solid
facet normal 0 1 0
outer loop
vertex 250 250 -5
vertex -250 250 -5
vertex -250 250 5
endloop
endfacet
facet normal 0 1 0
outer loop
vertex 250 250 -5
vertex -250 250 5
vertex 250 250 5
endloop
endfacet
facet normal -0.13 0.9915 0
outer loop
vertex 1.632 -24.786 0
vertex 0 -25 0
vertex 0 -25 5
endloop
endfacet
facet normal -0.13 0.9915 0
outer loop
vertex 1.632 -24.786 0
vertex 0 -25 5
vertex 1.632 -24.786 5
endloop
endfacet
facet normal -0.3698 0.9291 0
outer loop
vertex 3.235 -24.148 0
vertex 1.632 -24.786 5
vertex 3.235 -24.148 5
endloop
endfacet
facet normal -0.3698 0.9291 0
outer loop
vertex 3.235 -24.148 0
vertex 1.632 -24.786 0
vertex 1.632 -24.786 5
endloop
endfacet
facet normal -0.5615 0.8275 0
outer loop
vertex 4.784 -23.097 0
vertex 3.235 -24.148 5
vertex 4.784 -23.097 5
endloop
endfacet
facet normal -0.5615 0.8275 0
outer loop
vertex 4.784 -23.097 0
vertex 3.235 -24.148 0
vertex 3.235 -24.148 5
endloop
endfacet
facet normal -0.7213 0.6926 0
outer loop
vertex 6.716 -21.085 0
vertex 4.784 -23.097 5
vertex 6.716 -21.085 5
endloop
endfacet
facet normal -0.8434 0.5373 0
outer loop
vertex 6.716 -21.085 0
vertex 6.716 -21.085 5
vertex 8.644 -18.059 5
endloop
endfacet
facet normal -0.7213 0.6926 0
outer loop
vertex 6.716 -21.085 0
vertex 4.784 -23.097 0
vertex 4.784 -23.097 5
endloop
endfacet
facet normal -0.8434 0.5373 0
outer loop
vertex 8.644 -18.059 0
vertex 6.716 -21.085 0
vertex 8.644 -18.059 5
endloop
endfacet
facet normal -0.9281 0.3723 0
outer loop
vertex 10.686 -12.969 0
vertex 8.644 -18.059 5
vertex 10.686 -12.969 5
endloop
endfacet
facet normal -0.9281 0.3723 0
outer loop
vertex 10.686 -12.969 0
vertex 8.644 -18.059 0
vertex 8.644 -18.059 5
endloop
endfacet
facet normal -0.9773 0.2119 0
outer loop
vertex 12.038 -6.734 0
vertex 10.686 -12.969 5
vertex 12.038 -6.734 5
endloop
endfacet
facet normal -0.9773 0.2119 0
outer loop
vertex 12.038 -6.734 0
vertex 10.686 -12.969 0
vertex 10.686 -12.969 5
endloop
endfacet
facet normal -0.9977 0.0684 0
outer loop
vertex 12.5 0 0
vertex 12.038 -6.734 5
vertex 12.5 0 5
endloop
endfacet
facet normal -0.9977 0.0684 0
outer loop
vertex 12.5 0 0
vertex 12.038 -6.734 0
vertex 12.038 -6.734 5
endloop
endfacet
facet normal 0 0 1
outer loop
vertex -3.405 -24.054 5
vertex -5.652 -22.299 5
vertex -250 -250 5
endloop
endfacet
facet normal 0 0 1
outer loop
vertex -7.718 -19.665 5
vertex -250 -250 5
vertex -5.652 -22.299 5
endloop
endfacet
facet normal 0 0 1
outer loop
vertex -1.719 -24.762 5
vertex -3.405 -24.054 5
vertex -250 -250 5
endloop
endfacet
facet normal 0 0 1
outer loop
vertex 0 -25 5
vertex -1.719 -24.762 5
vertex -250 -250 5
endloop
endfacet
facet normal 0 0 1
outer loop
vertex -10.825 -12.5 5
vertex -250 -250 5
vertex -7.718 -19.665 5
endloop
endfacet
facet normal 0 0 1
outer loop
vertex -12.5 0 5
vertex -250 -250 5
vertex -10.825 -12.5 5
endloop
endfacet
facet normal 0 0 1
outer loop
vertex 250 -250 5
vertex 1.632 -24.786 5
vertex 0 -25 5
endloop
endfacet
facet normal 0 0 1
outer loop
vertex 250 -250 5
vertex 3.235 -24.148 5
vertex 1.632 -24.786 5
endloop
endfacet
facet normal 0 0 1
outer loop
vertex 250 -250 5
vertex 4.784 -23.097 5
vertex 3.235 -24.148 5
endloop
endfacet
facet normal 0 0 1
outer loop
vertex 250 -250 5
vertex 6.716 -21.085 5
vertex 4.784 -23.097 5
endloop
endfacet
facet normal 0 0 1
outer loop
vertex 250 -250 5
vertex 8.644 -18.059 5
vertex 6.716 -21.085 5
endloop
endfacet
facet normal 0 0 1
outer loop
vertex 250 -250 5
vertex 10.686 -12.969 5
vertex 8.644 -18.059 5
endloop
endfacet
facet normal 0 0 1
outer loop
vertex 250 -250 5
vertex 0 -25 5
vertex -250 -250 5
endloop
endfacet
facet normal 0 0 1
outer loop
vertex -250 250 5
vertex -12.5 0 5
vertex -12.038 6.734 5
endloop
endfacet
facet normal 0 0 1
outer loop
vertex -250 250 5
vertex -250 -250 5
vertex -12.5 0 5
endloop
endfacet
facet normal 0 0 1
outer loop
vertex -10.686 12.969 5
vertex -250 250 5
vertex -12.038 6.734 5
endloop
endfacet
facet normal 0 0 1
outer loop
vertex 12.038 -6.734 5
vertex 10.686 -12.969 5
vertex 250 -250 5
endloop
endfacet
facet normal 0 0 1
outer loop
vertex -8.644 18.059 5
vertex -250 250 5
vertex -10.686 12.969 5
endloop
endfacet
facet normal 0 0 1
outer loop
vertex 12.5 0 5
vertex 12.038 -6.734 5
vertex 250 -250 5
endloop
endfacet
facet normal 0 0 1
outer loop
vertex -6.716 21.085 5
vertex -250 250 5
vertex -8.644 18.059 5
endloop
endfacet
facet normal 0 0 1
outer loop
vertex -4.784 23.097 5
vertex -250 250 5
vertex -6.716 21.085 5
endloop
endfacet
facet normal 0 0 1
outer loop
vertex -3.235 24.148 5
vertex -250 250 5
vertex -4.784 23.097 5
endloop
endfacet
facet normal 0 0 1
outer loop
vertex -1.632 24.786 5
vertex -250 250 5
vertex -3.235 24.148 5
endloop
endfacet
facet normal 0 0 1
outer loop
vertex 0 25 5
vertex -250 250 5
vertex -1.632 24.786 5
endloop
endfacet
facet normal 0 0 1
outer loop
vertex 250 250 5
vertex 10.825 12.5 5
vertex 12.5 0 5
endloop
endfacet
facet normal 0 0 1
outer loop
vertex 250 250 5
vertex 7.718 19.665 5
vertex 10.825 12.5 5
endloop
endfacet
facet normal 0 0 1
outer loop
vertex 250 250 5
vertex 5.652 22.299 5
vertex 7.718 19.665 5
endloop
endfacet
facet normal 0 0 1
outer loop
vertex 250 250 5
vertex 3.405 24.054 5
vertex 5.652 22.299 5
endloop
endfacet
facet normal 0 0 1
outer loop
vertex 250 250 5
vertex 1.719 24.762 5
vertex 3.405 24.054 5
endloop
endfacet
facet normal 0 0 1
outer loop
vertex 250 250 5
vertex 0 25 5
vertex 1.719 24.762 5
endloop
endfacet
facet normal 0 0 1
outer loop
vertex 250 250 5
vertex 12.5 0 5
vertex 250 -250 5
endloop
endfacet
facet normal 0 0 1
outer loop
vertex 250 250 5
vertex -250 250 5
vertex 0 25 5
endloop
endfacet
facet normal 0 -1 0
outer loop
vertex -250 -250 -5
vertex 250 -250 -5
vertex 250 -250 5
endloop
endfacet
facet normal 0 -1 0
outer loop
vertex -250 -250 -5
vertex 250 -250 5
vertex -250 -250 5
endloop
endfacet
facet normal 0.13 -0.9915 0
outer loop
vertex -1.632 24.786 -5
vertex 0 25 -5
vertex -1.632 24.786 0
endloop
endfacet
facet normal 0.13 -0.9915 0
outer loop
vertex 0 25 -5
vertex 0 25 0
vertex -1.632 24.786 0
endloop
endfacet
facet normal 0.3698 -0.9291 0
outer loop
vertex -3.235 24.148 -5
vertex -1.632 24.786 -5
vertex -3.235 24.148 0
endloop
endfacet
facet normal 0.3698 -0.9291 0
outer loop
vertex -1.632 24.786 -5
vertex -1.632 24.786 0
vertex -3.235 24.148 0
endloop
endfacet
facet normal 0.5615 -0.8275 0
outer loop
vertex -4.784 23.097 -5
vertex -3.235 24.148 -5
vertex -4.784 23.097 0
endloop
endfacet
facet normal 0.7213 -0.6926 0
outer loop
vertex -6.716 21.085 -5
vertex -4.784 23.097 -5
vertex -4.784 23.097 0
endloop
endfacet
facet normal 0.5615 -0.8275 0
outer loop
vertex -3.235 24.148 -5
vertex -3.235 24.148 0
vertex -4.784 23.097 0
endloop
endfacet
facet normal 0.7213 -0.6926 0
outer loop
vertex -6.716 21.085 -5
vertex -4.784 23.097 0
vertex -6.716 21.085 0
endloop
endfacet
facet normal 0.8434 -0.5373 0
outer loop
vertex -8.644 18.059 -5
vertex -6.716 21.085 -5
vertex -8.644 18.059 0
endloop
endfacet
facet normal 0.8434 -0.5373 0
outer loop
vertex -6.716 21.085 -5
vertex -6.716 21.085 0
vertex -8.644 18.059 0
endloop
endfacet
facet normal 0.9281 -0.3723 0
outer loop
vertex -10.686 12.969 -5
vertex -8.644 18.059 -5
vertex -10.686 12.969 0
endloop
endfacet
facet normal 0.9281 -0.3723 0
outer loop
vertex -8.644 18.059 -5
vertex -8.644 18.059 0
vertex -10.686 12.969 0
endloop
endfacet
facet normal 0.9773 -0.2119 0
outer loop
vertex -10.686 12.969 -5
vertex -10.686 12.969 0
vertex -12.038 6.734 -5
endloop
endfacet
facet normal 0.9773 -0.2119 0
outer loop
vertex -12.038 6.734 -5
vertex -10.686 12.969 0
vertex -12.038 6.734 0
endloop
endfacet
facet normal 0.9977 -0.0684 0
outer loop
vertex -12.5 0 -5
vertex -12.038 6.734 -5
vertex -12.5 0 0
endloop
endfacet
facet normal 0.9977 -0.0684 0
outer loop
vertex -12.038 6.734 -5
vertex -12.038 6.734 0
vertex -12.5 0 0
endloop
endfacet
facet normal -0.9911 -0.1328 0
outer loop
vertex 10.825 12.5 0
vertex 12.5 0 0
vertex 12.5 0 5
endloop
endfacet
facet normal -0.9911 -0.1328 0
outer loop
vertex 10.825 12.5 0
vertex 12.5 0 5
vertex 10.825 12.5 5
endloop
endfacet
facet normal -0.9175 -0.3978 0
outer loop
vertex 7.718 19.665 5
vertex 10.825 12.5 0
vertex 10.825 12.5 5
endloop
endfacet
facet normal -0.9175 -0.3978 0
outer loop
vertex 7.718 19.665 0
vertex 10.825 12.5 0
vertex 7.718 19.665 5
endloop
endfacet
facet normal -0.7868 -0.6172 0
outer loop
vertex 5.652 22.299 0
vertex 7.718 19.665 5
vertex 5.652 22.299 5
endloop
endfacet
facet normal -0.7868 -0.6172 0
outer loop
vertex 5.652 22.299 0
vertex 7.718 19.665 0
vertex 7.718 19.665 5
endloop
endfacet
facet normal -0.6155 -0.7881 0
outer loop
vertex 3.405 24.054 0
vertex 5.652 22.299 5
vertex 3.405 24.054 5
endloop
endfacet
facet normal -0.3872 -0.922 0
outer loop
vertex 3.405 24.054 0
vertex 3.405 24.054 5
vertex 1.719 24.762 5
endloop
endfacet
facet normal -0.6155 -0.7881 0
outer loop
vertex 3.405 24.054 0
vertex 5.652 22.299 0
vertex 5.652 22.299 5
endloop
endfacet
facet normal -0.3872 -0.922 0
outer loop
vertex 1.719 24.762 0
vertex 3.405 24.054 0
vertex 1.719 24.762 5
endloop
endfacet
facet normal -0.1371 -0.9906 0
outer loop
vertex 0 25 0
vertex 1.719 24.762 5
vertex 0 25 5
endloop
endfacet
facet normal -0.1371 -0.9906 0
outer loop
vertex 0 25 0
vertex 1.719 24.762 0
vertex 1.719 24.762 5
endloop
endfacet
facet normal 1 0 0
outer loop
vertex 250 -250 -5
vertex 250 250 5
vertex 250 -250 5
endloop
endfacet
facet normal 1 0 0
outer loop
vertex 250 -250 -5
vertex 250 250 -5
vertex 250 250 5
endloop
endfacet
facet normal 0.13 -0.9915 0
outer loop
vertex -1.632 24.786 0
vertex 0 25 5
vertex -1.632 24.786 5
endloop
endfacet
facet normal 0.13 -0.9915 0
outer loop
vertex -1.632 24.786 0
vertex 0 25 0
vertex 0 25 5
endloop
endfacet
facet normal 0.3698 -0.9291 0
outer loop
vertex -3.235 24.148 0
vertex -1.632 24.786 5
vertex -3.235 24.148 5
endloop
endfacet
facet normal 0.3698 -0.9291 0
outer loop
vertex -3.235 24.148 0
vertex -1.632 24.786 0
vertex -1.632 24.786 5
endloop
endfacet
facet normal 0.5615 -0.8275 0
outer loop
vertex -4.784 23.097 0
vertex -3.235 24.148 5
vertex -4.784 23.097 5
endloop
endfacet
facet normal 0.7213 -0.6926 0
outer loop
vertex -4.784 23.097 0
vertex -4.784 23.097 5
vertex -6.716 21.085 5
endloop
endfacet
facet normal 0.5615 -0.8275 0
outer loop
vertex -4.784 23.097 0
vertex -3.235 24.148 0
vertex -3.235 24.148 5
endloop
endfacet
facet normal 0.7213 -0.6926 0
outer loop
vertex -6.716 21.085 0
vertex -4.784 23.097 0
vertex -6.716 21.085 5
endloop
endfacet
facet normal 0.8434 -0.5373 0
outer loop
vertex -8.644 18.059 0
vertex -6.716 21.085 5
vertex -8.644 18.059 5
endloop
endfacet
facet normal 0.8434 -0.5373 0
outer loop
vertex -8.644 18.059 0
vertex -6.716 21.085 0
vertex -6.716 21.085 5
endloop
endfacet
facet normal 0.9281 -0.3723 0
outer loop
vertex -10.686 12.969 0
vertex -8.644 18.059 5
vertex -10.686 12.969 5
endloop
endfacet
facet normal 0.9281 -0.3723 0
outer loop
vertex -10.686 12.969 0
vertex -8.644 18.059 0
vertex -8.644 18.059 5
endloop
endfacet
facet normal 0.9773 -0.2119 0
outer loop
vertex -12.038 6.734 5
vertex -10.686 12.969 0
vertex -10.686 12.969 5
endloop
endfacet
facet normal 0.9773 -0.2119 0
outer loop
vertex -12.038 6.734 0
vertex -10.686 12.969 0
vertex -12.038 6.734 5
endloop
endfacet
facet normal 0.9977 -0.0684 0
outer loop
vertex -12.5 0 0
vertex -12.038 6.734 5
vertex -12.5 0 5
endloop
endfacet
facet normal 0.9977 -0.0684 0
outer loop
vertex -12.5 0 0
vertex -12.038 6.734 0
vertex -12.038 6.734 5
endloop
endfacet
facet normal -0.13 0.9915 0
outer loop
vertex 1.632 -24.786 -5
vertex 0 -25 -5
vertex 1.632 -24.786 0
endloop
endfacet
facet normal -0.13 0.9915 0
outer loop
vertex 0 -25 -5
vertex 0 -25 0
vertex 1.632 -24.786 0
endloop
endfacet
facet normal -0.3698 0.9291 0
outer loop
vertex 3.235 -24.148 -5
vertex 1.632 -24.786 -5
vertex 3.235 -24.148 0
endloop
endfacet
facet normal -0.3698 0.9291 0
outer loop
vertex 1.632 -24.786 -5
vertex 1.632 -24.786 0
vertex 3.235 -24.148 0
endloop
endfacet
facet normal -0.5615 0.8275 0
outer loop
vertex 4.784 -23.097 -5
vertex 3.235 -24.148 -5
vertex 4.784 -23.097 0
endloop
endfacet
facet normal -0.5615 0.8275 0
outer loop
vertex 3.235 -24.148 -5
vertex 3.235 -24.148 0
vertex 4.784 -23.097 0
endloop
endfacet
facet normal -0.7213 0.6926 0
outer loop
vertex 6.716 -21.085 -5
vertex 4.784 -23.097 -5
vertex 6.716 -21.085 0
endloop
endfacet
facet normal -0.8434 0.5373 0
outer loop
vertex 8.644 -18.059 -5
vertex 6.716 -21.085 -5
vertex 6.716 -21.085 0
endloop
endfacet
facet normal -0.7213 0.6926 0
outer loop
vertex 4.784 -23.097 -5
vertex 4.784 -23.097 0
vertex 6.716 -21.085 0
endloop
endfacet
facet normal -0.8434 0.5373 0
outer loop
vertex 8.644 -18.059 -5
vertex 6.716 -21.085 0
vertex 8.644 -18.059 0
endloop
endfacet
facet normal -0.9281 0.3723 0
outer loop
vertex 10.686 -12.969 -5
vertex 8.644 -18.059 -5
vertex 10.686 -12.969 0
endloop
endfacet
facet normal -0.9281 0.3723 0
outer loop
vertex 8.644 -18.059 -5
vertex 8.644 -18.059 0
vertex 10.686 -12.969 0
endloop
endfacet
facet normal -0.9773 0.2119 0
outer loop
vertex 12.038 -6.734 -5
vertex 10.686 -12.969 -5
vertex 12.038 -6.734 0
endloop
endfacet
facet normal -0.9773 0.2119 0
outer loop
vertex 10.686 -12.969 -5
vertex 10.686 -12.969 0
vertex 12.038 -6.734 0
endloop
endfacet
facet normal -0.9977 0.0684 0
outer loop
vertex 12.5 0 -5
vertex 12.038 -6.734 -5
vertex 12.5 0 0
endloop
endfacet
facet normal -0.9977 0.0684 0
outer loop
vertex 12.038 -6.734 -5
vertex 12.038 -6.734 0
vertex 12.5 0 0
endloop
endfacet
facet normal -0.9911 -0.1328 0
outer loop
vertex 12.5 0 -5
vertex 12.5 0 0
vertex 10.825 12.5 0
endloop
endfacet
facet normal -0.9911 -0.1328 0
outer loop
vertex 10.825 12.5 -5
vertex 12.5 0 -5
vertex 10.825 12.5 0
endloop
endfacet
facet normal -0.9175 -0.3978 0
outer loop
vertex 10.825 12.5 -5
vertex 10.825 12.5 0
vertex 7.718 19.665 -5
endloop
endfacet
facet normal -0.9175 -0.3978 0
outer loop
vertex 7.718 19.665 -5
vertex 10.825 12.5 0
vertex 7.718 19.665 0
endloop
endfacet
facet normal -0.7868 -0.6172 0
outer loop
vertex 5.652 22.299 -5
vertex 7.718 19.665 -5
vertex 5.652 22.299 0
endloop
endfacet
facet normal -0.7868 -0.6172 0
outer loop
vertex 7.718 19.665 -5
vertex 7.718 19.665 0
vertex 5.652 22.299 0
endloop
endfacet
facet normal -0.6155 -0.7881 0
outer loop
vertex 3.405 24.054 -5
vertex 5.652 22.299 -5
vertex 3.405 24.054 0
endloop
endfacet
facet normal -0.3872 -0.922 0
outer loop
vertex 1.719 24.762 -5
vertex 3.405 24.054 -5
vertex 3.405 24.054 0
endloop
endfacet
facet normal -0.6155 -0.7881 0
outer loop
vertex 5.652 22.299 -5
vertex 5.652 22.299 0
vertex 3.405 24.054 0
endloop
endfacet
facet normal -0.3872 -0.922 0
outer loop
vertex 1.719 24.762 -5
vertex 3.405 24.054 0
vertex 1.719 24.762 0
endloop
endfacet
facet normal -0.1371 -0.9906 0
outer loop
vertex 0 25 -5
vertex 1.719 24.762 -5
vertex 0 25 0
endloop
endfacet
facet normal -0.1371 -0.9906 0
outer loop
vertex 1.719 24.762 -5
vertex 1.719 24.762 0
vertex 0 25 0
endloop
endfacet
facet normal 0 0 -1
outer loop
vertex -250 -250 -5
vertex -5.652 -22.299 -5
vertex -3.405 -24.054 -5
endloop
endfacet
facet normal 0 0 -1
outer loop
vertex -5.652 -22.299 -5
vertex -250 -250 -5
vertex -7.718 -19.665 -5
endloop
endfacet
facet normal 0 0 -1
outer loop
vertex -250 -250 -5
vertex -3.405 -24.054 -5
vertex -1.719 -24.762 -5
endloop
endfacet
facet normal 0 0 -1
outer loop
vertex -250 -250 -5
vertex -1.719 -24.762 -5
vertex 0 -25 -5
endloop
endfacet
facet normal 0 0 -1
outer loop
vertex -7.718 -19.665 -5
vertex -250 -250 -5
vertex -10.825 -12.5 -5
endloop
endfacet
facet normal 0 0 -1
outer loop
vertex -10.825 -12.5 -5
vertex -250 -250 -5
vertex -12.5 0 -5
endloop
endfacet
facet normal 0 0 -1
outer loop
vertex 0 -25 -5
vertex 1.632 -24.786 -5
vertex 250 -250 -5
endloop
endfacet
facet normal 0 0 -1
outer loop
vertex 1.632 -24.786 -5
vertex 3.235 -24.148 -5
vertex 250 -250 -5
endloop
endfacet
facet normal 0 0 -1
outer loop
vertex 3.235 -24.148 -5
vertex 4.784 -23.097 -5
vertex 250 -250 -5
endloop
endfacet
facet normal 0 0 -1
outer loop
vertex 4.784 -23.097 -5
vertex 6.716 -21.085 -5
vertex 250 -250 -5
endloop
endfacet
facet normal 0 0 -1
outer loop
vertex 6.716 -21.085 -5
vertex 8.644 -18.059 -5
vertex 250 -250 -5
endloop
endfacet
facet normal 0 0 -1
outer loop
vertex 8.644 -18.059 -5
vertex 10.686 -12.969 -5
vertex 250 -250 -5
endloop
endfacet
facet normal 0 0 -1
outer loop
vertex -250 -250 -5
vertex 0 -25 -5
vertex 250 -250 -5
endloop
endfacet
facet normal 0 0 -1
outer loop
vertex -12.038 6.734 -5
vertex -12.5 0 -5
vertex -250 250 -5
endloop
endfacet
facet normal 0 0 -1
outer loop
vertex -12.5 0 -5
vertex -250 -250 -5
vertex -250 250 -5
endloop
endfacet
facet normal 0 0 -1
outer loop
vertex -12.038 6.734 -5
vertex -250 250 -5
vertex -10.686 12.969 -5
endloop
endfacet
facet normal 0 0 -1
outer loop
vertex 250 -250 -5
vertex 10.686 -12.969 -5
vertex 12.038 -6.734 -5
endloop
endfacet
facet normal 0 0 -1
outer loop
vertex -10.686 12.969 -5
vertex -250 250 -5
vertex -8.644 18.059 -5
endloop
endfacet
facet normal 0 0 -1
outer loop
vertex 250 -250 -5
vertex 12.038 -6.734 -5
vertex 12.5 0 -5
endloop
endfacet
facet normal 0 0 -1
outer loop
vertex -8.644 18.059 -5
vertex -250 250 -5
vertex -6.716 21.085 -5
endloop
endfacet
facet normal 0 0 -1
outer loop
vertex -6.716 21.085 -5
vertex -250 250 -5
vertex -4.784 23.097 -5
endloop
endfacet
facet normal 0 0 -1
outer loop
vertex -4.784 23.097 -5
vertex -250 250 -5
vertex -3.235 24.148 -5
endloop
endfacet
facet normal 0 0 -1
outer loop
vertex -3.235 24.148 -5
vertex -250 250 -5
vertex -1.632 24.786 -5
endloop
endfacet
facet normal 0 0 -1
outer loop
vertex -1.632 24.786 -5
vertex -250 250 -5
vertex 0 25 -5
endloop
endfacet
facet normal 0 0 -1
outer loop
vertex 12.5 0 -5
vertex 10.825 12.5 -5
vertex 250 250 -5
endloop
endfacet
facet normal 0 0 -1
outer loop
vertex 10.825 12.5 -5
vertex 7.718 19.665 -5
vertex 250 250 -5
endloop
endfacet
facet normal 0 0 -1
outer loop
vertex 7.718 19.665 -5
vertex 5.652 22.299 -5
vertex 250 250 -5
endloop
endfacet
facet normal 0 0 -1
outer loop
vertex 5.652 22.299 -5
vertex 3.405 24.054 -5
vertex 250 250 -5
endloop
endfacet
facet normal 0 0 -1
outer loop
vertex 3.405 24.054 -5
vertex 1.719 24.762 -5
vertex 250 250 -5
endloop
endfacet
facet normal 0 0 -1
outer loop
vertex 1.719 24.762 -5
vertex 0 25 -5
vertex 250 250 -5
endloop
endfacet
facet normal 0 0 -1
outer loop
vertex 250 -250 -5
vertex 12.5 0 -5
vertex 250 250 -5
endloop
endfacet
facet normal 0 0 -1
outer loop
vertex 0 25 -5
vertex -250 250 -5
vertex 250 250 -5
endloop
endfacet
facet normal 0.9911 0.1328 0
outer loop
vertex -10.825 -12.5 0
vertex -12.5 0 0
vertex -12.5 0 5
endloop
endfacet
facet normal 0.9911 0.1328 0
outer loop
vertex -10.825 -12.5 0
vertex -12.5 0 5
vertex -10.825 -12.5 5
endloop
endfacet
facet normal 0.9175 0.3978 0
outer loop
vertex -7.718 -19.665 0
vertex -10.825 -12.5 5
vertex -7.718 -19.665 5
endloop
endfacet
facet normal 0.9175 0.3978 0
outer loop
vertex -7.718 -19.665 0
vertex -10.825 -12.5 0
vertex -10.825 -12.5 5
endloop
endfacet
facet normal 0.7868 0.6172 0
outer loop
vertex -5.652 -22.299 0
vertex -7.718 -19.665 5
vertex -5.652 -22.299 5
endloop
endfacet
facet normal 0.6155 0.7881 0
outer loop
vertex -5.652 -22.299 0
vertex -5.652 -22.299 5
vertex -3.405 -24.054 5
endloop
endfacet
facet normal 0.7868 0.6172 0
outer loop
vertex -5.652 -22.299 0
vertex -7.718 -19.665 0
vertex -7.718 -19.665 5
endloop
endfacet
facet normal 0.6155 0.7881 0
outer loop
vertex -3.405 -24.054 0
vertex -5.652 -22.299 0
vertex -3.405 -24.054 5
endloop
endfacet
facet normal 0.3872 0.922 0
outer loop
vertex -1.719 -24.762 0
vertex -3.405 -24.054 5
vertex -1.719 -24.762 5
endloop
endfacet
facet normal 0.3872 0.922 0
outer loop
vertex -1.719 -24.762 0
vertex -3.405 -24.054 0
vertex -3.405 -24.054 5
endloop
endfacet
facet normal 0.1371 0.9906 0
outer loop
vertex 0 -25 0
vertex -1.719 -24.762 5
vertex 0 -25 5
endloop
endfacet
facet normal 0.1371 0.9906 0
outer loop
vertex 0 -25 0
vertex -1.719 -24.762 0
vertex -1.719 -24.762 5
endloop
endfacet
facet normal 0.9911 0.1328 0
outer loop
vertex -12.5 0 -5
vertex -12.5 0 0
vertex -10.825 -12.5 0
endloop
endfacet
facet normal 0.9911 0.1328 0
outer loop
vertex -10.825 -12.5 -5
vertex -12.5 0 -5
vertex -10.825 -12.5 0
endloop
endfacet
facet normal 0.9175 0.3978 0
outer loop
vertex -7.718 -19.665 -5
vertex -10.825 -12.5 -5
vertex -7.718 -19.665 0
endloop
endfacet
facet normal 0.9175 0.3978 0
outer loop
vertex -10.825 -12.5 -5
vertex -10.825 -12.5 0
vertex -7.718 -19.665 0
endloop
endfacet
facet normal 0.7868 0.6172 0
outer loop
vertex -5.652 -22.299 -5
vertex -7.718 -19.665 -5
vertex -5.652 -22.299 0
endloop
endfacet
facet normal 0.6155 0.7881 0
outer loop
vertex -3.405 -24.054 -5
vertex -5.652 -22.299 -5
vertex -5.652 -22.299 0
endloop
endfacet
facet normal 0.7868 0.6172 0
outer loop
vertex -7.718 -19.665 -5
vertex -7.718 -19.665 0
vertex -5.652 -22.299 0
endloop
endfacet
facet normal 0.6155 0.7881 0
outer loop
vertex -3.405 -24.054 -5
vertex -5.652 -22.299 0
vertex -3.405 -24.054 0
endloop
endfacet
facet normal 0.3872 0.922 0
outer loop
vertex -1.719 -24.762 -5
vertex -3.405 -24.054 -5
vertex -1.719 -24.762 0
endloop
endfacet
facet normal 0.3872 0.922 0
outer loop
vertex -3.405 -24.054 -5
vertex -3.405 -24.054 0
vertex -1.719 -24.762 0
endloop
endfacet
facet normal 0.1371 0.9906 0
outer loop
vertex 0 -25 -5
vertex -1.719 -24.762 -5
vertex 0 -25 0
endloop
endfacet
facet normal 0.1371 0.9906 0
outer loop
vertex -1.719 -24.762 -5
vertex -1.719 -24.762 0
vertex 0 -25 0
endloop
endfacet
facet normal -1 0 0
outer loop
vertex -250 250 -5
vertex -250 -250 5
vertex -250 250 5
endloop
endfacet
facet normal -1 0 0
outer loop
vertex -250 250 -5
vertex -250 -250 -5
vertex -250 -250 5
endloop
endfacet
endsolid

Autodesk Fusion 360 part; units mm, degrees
sketch "Sketch1" plane through (0, 0, 0) normal (0, 0, 1) x (1, 0, 0)
  line L0 (-250, 250) -> (250, 250)
  line L1 (250, 250) -> (250, -250)
  line L2 (250, -250) -> (-250, -250)
  line L3 (-250, -250) -> (-250, 250)
  line L4 (0, 250) -> (0, -250) construction
  line L5 (-250, 0) -> (250, 0) construction
  ellipse E0 centre (0, 0) end of major axis (0, 25) minor radius 12.5
  line L6 (0, -25) -> (0, 25)
  line L7 (12.5, 0) -> (-12.5, 0)
  dimension "Total_Width" = 500
  dimension "Major_Radius" = 25
  dimension "Minor_Radius" = 12.5
extrude "Extrude1" add sketch "Sketch1" along normal mid plane 10
equation "Thickness = 1 cm"
